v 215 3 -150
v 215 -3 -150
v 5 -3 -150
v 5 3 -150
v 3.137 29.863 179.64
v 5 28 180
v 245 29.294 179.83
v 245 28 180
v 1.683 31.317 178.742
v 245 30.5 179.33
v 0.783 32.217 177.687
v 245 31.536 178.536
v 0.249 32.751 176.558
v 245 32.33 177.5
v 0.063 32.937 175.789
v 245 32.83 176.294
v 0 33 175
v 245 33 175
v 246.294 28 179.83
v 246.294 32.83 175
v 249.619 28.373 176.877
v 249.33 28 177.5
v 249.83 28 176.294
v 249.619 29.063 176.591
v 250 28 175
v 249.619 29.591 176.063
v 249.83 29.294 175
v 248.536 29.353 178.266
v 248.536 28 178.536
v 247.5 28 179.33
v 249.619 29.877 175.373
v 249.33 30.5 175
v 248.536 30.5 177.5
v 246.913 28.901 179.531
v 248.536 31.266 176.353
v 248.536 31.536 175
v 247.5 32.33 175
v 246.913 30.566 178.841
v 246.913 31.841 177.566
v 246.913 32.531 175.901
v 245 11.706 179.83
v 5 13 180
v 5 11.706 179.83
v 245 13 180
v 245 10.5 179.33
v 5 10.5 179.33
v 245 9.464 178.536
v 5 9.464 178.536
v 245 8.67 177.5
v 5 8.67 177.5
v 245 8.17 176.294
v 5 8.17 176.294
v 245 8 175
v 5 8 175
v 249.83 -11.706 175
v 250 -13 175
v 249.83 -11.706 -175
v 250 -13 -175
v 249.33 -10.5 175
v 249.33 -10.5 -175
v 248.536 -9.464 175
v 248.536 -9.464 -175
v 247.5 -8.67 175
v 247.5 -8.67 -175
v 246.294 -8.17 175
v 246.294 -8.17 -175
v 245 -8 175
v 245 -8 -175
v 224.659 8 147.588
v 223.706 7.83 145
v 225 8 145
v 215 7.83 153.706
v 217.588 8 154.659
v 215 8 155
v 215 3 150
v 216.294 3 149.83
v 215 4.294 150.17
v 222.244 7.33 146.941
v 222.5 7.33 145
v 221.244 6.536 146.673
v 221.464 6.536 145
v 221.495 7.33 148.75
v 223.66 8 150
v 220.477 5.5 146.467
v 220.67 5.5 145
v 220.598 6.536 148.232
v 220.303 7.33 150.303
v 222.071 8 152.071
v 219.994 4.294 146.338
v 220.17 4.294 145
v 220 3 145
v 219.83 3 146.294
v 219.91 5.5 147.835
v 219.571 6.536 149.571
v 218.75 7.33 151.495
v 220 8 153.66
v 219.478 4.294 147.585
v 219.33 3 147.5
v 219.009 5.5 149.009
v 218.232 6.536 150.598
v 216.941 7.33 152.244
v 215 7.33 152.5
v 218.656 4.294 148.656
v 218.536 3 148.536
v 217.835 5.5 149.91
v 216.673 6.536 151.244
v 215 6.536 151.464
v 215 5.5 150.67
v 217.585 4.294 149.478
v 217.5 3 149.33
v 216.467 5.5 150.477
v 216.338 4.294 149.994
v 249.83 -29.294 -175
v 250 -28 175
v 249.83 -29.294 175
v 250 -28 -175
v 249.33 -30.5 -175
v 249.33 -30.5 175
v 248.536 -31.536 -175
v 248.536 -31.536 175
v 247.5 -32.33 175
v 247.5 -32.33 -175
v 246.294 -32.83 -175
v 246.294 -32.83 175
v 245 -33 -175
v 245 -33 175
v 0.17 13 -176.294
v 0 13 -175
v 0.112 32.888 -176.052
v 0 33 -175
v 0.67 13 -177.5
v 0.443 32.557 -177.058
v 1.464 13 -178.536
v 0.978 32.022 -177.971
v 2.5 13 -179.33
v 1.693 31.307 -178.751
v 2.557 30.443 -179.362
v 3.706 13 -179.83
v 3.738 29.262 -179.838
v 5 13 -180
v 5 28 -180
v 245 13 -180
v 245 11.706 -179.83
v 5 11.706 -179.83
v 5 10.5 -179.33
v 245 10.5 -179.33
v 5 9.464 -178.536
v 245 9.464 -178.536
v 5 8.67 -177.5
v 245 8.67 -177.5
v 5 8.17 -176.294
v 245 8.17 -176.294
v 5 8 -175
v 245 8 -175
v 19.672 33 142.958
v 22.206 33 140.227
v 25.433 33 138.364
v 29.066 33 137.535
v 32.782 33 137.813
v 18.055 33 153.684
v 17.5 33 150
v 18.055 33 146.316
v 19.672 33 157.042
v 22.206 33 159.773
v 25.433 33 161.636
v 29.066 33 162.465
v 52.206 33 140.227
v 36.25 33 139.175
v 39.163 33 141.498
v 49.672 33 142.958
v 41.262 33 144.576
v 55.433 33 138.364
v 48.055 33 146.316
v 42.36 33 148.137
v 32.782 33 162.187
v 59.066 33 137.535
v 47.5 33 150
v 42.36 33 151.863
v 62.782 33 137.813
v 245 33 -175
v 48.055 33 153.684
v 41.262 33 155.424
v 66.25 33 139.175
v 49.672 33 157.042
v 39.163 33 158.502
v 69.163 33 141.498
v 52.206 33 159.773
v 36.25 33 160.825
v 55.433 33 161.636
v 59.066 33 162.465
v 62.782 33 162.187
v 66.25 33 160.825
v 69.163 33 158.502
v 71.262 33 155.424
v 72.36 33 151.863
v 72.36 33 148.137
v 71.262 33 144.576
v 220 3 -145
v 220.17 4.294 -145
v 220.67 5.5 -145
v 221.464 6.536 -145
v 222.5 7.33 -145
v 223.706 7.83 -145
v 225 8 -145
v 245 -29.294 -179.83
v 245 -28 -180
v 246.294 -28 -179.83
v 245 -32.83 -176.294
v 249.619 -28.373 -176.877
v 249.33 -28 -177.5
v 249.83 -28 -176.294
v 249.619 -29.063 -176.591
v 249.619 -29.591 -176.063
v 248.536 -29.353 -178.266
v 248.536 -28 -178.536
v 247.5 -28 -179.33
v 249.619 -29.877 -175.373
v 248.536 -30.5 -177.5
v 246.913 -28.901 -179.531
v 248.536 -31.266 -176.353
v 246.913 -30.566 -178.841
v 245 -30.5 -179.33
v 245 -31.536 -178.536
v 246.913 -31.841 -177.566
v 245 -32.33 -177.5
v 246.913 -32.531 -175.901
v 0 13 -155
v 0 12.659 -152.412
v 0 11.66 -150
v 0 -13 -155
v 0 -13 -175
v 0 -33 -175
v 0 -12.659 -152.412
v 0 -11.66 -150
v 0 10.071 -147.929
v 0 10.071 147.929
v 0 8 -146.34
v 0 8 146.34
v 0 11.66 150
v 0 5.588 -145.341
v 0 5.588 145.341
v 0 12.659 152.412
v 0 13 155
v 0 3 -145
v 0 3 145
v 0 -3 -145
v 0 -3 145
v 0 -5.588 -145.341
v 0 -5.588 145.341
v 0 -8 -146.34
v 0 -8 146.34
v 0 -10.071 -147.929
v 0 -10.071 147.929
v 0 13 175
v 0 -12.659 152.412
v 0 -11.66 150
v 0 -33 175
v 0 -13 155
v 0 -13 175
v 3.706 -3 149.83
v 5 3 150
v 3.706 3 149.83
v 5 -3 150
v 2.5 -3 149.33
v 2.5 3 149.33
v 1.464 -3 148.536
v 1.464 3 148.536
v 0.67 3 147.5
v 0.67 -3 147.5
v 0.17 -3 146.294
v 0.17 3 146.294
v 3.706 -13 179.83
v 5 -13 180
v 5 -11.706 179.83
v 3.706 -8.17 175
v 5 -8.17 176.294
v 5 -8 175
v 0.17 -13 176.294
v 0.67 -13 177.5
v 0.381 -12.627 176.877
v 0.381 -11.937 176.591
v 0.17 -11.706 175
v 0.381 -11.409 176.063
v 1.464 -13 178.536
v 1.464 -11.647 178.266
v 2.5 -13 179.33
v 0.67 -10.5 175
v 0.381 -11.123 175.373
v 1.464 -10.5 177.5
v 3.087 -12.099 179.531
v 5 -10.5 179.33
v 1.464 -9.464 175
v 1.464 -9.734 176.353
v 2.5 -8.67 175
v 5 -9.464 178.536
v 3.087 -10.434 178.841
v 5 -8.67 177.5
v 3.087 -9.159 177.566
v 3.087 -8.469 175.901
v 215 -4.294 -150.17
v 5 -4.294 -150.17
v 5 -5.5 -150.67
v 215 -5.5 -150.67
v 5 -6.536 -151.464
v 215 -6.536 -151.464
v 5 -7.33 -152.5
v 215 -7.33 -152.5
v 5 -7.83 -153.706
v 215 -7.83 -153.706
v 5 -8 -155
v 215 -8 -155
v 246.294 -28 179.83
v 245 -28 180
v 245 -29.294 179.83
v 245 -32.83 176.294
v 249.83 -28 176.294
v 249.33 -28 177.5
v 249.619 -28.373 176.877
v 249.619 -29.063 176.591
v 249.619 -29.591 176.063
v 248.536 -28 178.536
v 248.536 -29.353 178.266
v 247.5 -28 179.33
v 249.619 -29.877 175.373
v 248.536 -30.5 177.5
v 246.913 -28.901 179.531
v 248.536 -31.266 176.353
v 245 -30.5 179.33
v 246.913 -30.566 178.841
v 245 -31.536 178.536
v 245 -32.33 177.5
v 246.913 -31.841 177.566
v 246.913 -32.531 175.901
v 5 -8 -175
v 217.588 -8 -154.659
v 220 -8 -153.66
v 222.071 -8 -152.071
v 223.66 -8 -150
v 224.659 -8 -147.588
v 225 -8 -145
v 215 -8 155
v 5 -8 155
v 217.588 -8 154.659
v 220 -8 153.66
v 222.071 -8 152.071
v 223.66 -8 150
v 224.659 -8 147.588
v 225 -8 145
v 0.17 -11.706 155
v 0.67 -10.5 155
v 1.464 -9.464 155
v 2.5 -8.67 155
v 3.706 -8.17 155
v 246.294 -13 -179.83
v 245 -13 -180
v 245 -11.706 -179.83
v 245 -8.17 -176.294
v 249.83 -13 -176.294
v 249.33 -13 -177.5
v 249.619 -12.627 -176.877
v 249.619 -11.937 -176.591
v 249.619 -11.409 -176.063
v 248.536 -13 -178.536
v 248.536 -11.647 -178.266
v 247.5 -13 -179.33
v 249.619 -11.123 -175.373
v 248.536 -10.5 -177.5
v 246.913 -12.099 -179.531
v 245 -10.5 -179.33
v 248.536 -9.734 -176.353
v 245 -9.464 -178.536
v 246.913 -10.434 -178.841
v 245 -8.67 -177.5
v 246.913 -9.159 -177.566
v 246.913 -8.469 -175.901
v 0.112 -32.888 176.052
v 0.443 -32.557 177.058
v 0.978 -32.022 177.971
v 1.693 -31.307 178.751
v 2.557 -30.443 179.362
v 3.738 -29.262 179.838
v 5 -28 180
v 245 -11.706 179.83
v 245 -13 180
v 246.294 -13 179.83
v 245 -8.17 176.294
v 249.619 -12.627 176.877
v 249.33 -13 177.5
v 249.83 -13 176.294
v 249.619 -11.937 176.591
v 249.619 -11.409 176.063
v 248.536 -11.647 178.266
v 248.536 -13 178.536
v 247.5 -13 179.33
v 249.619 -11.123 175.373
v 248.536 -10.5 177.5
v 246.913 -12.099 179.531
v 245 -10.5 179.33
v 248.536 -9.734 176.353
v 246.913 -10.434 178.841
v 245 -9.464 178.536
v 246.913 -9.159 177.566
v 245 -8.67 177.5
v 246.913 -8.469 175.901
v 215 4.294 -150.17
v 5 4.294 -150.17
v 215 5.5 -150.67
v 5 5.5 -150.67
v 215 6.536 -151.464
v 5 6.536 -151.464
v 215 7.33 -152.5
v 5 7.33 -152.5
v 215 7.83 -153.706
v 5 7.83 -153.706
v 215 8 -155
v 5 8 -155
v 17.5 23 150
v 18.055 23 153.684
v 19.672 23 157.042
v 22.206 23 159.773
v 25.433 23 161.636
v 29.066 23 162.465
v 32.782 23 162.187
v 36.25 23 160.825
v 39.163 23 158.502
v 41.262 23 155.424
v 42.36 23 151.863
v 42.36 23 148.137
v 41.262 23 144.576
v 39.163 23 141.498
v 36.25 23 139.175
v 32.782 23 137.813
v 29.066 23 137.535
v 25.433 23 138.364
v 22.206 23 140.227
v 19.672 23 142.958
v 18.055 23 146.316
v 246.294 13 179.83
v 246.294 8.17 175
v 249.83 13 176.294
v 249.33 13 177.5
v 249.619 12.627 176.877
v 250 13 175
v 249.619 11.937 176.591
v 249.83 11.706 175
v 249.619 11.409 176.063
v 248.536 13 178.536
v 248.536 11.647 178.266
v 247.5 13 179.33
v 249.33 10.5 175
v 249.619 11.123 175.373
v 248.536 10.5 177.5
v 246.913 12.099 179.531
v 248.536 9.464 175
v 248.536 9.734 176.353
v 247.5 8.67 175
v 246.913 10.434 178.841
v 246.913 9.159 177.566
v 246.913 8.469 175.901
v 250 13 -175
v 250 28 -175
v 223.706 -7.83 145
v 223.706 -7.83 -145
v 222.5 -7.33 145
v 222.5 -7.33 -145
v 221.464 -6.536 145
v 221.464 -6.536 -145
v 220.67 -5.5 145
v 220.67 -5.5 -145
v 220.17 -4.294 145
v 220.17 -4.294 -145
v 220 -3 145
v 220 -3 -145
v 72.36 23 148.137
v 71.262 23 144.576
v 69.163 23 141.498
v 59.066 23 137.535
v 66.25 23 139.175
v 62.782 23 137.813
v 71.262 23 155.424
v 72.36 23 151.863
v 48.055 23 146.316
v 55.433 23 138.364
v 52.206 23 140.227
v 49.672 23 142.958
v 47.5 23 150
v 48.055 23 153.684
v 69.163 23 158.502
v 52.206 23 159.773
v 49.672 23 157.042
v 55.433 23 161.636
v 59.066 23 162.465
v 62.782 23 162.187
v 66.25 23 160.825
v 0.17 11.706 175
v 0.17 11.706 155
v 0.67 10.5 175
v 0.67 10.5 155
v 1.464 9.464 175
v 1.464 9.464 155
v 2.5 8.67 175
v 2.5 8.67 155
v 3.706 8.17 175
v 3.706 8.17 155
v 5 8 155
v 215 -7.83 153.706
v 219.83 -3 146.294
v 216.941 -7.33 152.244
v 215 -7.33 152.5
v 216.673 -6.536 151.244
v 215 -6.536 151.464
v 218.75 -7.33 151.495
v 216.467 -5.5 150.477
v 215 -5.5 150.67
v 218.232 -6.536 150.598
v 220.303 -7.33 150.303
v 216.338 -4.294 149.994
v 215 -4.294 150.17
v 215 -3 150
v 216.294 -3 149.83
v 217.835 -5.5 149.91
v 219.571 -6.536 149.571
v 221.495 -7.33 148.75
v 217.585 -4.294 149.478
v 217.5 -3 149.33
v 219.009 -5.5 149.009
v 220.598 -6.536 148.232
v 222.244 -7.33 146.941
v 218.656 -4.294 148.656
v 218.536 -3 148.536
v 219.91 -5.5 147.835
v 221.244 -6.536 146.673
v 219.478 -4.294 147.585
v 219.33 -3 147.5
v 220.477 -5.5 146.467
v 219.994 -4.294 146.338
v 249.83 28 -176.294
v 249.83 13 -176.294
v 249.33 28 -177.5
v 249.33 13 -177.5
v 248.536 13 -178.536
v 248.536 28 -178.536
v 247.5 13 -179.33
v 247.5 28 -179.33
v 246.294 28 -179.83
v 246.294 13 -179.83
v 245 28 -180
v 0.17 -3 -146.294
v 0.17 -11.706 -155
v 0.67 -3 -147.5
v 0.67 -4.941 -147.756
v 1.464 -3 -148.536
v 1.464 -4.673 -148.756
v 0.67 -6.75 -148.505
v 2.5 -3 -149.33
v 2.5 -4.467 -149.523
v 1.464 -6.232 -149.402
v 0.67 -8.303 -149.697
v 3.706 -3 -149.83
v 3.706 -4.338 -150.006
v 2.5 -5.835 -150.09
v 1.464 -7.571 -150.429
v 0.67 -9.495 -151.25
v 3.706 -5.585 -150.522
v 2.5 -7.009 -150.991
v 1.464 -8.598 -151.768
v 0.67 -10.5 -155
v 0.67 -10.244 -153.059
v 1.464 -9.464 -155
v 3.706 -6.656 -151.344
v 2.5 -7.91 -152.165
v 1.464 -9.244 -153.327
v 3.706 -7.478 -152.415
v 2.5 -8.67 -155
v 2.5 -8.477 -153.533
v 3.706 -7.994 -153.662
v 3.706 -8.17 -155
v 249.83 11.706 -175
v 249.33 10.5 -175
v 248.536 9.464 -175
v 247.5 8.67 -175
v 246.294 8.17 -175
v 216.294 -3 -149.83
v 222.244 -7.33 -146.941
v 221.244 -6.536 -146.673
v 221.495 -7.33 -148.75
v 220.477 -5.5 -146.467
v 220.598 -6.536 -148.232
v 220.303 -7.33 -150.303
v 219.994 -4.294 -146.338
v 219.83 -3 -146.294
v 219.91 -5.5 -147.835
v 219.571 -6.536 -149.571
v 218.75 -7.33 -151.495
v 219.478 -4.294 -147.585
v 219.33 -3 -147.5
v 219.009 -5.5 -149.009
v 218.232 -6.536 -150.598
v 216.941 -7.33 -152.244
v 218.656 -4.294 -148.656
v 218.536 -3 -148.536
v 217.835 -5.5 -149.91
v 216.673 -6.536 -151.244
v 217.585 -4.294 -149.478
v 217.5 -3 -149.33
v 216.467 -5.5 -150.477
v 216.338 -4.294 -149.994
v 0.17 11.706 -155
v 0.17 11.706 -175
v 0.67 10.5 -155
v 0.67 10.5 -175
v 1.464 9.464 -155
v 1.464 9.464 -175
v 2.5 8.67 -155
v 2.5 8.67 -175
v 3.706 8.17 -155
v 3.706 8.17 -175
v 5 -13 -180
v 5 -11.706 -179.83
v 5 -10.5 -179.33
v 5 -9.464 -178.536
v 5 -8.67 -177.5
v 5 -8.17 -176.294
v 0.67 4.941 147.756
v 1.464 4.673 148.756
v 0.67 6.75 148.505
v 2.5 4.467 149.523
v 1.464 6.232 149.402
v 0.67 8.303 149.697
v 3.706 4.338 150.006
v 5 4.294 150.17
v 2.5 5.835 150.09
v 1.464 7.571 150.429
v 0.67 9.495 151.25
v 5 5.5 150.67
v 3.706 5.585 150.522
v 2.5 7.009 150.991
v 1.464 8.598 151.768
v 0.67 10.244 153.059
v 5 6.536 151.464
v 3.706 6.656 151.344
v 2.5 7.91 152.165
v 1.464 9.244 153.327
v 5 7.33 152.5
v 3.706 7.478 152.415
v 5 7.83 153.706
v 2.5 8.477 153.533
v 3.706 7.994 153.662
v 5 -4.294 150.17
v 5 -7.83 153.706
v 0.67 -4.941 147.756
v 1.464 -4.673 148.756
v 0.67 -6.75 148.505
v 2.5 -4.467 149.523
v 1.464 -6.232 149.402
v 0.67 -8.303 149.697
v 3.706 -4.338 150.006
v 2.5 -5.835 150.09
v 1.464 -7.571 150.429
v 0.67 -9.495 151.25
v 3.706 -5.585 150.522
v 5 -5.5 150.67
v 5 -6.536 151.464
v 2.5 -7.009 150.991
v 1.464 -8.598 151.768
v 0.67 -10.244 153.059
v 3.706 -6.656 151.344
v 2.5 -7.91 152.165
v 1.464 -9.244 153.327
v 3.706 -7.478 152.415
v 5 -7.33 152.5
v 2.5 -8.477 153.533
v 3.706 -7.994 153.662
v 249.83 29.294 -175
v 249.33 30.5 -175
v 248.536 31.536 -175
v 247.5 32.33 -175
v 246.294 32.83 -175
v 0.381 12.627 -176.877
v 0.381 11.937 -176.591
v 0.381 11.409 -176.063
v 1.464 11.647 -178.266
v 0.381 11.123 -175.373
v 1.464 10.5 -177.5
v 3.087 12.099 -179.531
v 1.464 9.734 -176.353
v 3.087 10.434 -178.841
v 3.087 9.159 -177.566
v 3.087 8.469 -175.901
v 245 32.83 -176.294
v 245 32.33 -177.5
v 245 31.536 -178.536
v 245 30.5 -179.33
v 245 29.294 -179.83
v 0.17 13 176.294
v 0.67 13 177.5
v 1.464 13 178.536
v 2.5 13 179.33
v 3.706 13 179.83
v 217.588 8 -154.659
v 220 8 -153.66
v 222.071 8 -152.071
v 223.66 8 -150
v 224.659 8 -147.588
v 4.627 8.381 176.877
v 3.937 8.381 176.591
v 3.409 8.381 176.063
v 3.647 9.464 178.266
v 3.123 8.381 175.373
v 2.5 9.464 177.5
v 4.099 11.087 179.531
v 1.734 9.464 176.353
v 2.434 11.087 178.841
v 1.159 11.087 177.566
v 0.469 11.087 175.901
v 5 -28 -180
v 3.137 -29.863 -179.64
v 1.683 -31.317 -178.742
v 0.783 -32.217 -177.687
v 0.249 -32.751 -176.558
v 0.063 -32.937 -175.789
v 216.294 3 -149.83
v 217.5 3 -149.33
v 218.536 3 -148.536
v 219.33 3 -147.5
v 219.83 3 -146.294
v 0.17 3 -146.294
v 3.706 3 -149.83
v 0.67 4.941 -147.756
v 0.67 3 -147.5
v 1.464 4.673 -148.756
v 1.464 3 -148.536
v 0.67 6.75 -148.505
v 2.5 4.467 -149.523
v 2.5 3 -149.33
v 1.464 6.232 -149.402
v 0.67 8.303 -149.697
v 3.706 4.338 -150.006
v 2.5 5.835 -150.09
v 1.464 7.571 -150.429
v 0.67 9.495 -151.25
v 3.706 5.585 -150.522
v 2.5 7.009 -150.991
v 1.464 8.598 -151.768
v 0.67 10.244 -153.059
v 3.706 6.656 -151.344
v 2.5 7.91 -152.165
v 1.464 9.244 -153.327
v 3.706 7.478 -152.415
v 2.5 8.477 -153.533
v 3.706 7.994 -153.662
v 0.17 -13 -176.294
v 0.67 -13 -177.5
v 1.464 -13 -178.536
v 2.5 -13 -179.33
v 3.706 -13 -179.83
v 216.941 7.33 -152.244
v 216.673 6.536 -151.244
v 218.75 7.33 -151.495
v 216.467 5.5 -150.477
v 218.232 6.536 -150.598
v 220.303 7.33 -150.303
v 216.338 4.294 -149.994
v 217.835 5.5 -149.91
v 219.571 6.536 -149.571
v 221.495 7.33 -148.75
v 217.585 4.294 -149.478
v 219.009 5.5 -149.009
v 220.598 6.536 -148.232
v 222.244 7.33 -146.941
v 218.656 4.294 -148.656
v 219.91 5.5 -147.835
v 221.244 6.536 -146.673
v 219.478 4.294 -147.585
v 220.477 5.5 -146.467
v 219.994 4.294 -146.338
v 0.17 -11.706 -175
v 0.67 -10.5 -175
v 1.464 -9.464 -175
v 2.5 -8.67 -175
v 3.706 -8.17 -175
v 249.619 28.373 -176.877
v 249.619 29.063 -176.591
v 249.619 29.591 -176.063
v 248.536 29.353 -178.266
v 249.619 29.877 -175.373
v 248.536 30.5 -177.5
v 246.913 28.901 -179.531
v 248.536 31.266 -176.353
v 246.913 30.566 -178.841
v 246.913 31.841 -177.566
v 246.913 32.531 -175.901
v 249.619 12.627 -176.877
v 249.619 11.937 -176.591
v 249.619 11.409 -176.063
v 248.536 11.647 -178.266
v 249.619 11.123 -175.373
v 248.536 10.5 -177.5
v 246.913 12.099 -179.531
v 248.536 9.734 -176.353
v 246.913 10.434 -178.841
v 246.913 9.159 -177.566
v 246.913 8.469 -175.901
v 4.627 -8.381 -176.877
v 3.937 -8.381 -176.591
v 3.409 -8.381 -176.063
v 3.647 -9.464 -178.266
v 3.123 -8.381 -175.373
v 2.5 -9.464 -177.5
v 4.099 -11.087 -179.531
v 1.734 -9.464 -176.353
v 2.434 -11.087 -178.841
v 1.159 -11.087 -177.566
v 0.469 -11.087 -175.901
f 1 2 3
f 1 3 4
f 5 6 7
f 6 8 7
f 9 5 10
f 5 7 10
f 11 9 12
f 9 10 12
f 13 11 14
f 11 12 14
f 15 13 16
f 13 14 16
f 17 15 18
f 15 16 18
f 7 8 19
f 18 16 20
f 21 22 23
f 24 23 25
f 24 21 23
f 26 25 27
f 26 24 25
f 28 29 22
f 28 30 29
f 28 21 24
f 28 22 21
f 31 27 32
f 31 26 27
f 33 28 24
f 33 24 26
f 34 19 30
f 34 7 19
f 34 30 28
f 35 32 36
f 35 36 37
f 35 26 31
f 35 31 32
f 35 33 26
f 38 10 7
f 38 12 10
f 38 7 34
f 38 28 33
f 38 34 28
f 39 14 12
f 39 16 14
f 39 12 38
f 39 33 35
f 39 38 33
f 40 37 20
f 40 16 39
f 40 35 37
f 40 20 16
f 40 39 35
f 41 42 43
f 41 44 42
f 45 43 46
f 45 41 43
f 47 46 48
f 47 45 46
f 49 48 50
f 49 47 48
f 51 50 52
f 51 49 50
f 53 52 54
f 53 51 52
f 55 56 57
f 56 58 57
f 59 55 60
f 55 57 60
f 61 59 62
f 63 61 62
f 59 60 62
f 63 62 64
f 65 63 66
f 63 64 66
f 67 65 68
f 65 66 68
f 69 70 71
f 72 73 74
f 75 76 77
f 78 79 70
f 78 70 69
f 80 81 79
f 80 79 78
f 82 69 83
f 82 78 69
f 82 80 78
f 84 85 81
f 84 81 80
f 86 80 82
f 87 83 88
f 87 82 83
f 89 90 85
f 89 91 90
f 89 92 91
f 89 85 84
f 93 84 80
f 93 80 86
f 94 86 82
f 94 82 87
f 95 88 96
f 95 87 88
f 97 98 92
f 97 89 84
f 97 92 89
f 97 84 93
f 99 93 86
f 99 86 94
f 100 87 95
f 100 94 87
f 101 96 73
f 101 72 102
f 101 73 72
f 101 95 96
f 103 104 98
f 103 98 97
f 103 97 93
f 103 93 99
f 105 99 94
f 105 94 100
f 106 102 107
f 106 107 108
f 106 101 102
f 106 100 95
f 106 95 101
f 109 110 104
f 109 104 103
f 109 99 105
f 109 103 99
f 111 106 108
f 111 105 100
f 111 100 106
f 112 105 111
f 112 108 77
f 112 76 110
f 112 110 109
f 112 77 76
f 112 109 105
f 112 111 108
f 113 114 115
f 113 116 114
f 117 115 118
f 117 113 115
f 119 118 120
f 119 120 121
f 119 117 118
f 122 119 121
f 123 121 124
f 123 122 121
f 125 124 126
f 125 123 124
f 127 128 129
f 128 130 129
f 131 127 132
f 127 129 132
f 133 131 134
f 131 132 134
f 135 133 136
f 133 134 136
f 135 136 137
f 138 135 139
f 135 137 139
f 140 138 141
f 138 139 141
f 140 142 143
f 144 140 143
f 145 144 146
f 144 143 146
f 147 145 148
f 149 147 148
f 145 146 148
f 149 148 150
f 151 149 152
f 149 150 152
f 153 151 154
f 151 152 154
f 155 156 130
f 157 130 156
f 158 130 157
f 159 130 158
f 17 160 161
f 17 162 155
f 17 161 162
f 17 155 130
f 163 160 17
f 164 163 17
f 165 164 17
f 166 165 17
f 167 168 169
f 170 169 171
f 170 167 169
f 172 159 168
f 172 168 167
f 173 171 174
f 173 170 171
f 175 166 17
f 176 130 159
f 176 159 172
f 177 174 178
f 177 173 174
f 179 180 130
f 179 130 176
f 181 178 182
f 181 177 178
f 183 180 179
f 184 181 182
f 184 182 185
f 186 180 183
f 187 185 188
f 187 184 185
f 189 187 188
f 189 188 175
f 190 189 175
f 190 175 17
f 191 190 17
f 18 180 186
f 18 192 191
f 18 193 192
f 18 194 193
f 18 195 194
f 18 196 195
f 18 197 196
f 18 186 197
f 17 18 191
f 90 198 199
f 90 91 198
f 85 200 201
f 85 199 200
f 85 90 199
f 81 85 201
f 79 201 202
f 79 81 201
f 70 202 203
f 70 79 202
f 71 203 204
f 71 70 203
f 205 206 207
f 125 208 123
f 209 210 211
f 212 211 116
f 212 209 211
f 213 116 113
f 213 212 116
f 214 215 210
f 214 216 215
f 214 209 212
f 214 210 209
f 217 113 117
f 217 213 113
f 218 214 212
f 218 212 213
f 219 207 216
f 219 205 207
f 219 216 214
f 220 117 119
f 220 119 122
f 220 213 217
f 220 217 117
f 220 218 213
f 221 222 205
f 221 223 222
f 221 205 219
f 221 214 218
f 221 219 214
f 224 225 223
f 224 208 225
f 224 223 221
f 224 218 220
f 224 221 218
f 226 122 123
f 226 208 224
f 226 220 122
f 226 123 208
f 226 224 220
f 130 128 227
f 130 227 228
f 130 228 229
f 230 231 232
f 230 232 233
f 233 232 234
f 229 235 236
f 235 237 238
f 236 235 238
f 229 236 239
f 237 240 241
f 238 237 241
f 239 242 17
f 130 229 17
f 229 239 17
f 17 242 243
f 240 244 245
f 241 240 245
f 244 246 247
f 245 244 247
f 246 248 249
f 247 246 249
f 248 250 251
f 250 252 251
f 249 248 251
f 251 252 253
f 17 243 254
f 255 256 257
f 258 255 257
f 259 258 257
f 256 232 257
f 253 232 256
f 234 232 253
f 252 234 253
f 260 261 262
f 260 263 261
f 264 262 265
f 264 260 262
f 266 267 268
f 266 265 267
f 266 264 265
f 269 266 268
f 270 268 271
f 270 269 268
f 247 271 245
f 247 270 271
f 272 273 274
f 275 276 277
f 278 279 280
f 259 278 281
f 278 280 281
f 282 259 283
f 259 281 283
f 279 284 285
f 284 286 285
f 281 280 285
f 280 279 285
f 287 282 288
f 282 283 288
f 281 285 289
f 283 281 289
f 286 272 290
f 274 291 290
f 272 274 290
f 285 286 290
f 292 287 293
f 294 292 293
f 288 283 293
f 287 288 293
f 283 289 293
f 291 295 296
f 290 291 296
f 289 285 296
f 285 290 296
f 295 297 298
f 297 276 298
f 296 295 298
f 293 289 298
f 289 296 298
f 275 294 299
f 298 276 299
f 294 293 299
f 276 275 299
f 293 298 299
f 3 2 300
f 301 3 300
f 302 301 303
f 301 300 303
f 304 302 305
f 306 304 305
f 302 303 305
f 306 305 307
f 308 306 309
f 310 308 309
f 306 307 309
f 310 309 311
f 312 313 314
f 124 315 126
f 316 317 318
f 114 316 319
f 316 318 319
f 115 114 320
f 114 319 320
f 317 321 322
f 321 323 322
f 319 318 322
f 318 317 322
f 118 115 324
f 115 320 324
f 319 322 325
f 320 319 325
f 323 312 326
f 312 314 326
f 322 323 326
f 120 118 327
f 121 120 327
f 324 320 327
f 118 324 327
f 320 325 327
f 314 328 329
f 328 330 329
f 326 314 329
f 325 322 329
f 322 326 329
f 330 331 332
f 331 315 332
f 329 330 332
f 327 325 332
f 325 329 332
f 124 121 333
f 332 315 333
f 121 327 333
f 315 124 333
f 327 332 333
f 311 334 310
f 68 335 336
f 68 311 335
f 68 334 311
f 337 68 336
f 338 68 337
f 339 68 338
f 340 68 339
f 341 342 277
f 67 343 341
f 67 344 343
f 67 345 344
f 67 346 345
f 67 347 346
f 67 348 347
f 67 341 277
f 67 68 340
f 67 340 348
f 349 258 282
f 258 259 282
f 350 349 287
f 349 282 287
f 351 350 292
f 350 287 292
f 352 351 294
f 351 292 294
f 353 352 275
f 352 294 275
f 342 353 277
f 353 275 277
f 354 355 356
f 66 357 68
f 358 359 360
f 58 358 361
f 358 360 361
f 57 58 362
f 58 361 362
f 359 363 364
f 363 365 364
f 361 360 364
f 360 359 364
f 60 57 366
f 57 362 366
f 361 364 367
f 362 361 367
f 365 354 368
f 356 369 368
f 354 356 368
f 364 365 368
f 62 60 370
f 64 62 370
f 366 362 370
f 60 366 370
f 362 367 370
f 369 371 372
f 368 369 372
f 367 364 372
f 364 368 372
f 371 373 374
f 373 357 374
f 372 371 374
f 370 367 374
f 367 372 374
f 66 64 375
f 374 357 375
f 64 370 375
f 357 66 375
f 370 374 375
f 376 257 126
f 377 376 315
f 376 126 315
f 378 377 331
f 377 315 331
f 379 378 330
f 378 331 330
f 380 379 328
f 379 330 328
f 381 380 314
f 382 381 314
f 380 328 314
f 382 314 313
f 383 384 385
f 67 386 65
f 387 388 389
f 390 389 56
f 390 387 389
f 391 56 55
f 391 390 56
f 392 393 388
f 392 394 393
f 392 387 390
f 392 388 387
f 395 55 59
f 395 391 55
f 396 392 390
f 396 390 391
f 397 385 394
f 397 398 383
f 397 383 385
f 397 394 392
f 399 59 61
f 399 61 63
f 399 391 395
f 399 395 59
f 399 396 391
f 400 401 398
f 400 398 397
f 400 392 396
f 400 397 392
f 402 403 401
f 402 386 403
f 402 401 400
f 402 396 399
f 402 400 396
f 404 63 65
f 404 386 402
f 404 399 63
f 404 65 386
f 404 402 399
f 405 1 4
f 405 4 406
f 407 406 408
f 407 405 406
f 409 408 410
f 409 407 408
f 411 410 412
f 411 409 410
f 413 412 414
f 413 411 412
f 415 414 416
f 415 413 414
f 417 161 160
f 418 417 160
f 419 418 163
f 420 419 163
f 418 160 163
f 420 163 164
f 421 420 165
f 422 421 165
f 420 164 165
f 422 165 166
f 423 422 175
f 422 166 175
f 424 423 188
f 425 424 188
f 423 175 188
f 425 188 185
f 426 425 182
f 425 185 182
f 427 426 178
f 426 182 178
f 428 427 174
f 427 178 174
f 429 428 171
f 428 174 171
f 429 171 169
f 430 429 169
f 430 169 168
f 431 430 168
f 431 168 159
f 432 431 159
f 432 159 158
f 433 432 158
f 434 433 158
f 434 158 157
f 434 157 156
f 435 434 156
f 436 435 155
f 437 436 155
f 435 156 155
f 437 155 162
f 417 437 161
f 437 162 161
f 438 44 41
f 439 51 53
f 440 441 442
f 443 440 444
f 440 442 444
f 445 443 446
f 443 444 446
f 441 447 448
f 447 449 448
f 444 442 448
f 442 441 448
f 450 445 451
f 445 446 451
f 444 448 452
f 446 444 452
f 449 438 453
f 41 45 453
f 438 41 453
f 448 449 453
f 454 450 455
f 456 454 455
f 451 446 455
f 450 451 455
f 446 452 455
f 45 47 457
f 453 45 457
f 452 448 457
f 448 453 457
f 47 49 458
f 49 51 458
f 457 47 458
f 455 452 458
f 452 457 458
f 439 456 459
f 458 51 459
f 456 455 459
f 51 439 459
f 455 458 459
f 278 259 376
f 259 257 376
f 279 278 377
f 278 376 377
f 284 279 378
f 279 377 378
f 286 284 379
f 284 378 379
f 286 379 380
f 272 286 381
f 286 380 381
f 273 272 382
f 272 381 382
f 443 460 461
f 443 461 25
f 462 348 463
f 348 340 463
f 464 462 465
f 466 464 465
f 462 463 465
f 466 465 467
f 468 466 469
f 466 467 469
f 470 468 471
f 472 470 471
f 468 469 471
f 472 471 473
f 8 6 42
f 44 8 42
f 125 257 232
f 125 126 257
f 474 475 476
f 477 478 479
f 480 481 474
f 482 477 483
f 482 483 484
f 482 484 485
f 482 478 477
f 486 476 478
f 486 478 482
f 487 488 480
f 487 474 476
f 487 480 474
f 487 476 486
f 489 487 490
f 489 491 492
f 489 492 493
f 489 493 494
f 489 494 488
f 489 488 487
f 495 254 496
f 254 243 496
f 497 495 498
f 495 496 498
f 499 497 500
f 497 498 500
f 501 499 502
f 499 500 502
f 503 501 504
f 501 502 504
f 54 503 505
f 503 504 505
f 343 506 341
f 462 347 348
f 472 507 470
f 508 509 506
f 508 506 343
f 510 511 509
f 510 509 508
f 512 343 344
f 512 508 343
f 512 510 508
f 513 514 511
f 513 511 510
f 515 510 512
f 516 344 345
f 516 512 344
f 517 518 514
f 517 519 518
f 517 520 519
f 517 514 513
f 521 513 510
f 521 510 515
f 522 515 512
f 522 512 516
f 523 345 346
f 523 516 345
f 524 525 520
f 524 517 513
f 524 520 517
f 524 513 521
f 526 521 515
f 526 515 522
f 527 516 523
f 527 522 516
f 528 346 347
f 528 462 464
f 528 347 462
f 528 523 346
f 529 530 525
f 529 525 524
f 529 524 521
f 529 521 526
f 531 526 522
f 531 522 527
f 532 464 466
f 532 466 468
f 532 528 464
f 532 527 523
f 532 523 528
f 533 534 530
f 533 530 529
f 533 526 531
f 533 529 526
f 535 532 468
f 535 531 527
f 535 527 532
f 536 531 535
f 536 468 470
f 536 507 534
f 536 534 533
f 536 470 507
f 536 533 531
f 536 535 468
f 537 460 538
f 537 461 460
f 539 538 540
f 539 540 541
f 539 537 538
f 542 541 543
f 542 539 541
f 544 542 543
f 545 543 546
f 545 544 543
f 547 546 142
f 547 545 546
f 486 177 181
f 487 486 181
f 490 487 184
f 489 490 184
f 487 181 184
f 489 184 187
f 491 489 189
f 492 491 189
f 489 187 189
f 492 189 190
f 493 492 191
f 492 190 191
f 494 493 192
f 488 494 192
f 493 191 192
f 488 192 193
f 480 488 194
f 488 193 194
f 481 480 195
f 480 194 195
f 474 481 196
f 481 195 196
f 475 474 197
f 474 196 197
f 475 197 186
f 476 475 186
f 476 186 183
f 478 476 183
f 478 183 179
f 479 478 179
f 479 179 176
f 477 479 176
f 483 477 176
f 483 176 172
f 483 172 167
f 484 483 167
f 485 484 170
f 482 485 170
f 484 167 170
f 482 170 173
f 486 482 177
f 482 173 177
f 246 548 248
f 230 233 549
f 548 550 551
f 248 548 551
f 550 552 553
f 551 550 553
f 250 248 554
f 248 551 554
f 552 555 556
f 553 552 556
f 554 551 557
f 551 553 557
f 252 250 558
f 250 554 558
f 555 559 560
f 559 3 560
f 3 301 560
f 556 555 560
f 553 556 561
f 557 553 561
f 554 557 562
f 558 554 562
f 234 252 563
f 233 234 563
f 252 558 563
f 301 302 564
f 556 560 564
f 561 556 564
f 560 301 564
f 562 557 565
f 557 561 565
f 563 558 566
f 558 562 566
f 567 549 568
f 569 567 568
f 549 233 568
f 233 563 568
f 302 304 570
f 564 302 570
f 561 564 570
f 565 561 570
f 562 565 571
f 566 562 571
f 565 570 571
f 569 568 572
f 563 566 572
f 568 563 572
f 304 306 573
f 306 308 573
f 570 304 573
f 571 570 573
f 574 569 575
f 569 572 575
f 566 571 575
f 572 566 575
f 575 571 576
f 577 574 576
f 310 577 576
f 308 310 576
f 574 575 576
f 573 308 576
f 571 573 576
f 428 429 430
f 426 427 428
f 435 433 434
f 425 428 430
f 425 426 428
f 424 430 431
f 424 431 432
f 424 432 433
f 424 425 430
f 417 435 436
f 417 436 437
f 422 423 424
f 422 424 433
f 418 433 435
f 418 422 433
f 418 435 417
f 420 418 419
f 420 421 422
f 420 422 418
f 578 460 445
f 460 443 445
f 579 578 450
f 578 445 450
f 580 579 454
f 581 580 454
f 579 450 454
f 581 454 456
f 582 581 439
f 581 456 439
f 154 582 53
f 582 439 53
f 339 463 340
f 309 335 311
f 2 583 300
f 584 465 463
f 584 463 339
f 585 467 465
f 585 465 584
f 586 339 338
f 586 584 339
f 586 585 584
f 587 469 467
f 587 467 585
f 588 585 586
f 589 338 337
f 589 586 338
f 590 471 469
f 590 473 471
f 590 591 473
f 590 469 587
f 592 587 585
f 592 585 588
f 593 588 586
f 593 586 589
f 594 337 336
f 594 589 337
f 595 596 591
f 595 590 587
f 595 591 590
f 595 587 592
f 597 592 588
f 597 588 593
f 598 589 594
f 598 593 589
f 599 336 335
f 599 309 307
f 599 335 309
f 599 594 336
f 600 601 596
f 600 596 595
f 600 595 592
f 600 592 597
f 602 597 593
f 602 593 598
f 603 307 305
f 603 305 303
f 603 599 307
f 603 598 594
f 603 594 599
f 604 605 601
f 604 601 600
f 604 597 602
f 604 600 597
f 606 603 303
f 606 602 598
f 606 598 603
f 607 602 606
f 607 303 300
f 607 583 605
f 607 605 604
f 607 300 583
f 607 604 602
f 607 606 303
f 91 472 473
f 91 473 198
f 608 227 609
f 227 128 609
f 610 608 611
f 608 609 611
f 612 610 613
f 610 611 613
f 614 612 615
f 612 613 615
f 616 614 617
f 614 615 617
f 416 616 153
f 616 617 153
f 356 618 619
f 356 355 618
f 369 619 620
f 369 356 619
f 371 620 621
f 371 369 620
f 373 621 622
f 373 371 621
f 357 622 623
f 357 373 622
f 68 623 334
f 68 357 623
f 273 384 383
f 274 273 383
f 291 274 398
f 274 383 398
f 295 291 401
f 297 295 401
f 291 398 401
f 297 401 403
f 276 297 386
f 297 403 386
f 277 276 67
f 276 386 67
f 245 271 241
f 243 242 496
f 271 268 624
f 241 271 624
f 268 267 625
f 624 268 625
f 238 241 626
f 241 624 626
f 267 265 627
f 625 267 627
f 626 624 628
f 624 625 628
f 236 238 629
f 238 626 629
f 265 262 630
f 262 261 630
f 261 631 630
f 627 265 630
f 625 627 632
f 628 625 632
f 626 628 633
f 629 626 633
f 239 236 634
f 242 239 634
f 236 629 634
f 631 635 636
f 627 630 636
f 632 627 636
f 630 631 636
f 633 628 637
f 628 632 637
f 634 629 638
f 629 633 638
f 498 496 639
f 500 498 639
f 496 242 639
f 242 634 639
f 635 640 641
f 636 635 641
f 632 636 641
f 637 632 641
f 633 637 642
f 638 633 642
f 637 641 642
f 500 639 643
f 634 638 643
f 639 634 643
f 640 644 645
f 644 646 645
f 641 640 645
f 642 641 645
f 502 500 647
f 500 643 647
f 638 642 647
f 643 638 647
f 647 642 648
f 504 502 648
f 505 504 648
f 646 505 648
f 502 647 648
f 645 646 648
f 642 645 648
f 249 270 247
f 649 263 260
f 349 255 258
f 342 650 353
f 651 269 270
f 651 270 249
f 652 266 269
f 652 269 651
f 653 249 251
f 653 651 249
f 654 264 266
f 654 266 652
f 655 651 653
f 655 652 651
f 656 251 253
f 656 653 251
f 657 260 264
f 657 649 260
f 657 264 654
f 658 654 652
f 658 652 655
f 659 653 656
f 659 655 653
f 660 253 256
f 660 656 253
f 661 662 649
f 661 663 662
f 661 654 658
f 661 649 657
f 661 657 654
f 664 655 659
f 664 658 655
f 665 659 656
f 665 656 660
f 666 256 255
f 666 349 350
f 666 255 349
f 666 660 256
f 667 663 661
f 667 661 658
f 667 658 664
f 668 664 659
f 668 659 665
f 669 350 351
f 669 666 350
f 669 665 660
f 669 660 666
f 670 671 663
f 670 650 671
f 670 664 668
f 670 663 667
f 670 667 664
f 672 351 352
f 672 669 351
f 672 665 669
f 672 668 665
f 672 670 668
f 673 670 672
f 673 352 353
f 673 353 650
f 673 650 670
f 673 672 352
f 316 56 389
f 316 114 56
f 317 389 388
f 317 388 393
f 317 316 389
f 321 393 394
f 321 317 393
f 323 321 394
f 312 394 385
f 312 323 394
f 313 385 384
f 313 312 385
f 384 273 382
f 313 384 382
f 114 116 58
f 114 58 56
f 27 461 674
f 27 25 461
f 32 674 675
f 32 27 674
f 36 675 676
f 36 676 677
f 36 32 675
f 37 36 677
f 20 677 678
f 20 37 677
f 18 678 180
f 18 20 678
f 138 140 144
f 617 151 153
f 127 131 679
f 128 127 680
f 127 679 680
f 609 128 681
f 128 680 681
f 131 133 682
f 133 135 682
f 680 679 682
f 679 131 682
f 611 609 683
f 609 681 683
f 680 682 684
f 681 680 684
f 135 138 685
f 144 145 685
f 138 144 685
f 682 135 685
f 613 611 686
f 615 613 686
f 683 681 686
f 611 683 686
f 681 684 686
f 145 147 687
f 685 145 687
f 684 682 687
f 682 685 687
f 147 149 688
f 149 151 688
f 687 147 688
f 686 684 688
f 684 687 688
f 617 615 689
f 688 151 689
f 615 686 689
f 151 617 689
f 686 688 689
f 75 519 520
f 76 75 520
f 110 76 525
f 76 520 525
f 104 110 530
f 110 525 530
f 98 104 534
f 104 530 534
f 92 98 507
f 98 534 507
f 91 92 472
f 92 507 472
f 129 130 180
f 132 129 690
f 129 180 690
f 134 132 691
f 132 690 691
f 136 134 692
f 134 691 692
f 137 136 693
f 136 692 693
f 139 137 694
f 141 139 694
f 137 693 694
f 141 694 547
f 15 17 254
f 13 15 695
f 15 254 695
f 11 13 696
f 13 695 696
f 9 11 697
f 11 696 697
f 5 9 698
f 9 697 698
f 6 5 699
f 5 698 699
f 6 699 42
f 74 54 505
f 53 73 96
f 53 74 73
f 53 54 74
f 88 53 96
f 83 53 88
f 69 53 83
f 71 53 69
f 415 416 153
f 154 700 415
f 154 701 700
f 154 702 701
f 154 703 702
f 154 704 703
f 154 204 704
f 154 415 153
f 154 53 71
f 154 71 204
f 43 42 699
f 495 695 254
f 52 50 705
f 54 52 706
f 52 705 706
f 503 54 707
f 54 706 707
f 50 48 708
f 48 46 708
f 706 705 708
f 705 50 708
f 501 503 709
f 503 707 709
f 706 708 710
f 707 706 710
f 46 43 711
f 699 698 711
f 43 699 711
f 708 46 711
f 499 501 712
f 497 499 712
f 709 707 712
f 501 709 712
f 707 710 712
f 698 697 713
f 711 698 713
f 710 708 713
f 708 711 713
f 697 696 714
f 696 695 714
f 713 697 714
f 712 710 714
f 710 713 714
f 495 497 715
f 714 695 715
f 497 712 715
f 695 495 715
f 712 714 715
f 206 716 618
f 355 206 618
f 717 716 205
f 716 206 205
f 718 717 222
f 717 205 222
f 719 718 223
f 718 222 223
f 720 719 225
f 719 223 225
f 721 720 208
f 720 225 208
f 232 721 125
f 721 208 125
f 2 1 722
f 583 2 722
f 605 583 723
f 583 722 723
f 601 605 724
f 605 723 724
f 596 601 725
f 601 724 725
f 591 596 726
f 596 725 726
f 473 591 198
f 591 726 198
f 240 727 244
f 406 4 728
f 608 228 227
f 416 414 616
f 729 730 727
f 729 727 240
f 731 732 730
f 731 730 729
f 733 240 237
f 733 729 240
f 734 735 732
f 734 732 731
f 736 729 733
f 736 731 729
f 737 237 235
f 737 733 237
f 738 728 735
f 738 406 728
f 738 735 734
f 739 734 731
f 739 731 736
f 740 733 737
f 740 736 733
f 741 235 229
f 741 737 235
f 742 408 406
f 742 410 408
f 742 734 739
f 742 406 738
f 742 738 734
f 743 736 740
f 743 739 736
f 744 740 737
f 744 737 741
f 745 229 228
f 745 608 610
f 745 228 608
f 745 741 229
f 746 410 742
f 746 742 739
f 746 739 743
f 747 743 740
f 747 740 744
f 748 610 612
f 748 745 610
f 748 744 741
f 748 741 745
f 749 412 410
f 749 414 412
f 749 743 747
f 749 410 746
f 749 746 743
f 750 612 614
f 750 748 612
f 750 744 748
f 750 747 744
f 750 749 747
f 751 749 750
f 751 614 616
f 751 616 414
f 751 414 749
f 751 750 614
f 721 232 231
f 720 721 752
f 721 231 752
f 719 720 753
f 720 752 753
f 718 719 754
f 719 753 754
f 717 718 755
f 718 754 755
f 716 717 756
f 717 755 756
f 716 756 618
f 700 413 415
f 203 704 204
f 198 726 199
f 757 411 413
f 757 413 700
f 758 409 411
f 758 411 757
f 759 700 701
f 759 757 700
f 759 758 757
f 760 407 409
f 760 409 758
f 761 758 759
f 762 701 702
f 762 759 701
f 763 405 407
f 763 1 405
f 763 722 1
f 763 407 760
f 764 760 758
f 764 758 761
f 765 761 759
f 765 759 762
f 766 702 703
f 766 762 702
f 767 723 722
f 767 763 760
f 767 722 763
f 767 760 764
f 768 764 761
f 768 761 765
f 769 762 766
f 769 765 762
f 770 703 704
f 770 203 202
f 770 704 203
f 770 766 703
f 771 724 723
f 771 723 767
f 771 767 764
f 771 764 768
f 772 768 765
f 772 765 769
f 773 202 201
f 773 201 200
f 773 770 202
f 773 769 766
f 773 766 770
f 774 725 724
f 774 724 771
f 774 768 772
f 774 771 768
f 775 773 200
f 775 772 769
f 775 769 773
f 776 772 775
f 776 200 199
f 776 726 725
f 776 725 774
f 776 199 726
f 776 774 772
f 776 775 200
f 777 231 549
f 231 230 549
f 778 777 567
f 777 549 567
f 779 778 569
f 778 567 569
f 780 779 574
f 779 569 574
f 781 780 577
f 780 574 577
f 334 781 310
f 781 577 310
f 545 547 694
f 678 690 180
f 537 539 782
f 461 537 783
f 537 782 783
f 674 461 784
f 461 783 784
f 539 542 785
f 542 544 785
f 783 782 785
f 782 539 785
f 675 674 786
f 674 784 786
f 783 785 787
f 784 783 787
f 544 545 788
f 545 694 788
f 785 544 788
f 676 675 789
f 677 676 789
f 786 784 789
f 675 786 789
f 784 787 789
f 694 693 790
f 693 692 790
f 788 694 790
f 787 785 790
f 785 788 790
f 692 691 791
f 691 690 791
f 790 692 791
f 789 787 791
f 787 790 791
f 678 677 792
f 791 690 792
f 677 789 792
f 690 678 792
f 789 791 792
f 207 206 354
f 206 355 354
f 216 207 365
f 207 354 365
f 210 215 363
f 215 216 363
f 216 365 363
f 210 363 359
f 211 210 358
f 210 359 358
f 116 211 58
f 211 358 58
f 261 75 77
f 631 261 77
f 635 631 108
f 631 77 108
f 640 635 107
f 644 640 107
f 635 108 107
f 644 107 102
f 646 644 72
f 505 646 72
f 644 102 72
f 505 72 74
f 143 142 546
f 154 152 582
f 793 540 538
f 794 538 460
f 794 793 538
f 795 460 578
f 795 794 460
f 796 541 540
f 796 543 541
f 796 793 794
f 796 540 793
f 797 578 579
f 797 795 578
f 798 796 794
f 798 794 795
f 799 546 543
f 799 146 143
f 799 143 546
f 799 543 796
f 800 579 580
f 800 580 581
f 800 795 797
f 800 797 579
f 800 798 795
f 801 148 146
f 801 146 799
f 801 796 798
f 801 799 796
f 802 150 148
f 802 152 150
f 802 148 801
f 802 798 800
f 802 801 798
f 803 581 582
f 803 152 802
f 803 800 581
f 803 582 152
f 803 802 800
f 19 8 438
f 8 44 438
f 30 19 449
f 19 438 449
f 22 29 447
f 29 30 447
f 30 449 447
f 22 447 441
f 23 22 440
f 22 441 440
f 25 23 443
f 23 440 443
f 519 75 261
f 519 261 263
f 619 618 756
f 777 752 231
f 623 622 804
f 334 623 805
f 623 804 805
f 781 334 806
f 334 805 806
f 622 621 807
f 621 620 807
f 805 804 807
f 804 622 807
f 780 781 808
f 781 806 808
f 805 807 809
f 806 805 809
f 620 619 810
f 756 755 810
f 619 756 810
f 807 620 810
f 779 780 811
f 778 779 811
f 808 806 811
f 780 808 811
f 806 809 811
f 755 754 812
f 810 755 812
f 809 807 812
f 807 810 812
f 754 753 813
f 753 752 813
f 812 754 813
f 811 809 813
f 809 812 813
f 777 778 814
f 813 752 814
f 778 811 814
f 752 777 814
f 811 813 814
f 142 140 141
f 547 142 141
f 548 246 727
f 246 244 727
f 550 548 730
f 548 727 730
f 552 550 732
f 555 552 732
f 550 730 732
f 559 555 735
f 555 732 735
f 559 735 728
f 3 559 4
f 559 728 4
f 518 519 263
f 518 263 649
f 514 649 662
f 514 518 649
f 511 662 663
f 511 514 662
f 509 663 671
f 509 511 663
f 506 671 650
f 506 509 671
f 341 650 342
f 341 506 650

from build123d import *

# Parameters (mm, degrees)
F3_R     = 12.5
F4_DEPTH = 10
F6_DEPTH = 30
F7_R     = 5


with BuildPart() as f2:
    # F2: sweep along a path in F1
    with BuildLine(Plane.XZ) as f2_path:
        Line((0, 0), (250, 0))
    # F0 (on Right) → F2 (sweep)
    with BuildSketch(Plane.YZ):
        Polygon((8, 150), (0, 150), (-8, 150), (-8, 180), (-33, 180), (-33, -180), (-8, -180), (-8, -150), (0, -150), (8, -150), (8, -180), (33, -180), (33, 180), (8, 180), align=None)
    sweep(path=f2_path.line)

    # F3 (on face) → F4 (cut)
    with BuildSketch(Plane(origin=(0, 33, 0), x_dir=(-1, 0, 0), z_dir=(0, 1, 0))):
        with Locations((-60, 150)):
            Circle(F3_R)
        with Locations((-30, 150)):
            Circle(F3_R)
    extrude(amount=-F4_DEPTH, mode=Mode.SUBTRACT)

    # F5 (on face) → F6 (cut)
    with BuildSketch(Plane.YZ.offset(250)):
        Polygon((8, 150), (0, 150), (-8, 150), (-8, -150), (0, -150), (8, -150), align=None)
    extrude(amount=-F6_DEPTH, mode=Mode.SUBTRACT)

    # F7
    f7_edges = [f2.edges().sort_by_distance(p)[0] for p in [
        (110, 8, 150),
        (220, 0, 150),
        (110, -8, 150),
        (0, 0, 150),
        (110, -8, -150),
        (220, 0, -150),
        (110, 8, -150),
        (0, 0, -150),
        (125, 8, -180),
        (0, 20.5, -180),
        (125, 33, -180),
        (250, 20.5, -180),
        (125, 33, 180),
        (0, 20.5, 180),
        (125, 8, 180),
        (250, 20.5, 180),
        (125, -8, 180),
        (0, -20.5, 180),
        (125, -33, 180),
        (250, -20.5, 180),
        (125, -33, -180),
        (0, -20.5, -180),
        (125, -8, -180),
        (250, -20.5, -180),
        (0, -8, 165),
        (0, -8, -165),
        (0, 8, -165),
        (0, 8, 165),
        (250, 8, 0),
        (250, 33, 0),
        (250, -8, 0),
        (250, -33, 0),
        (220, -8, 0),
        (220, 8, 0),
    ]]
    fillet(f7_edges, radius=F7_R)


solid = f2.part
